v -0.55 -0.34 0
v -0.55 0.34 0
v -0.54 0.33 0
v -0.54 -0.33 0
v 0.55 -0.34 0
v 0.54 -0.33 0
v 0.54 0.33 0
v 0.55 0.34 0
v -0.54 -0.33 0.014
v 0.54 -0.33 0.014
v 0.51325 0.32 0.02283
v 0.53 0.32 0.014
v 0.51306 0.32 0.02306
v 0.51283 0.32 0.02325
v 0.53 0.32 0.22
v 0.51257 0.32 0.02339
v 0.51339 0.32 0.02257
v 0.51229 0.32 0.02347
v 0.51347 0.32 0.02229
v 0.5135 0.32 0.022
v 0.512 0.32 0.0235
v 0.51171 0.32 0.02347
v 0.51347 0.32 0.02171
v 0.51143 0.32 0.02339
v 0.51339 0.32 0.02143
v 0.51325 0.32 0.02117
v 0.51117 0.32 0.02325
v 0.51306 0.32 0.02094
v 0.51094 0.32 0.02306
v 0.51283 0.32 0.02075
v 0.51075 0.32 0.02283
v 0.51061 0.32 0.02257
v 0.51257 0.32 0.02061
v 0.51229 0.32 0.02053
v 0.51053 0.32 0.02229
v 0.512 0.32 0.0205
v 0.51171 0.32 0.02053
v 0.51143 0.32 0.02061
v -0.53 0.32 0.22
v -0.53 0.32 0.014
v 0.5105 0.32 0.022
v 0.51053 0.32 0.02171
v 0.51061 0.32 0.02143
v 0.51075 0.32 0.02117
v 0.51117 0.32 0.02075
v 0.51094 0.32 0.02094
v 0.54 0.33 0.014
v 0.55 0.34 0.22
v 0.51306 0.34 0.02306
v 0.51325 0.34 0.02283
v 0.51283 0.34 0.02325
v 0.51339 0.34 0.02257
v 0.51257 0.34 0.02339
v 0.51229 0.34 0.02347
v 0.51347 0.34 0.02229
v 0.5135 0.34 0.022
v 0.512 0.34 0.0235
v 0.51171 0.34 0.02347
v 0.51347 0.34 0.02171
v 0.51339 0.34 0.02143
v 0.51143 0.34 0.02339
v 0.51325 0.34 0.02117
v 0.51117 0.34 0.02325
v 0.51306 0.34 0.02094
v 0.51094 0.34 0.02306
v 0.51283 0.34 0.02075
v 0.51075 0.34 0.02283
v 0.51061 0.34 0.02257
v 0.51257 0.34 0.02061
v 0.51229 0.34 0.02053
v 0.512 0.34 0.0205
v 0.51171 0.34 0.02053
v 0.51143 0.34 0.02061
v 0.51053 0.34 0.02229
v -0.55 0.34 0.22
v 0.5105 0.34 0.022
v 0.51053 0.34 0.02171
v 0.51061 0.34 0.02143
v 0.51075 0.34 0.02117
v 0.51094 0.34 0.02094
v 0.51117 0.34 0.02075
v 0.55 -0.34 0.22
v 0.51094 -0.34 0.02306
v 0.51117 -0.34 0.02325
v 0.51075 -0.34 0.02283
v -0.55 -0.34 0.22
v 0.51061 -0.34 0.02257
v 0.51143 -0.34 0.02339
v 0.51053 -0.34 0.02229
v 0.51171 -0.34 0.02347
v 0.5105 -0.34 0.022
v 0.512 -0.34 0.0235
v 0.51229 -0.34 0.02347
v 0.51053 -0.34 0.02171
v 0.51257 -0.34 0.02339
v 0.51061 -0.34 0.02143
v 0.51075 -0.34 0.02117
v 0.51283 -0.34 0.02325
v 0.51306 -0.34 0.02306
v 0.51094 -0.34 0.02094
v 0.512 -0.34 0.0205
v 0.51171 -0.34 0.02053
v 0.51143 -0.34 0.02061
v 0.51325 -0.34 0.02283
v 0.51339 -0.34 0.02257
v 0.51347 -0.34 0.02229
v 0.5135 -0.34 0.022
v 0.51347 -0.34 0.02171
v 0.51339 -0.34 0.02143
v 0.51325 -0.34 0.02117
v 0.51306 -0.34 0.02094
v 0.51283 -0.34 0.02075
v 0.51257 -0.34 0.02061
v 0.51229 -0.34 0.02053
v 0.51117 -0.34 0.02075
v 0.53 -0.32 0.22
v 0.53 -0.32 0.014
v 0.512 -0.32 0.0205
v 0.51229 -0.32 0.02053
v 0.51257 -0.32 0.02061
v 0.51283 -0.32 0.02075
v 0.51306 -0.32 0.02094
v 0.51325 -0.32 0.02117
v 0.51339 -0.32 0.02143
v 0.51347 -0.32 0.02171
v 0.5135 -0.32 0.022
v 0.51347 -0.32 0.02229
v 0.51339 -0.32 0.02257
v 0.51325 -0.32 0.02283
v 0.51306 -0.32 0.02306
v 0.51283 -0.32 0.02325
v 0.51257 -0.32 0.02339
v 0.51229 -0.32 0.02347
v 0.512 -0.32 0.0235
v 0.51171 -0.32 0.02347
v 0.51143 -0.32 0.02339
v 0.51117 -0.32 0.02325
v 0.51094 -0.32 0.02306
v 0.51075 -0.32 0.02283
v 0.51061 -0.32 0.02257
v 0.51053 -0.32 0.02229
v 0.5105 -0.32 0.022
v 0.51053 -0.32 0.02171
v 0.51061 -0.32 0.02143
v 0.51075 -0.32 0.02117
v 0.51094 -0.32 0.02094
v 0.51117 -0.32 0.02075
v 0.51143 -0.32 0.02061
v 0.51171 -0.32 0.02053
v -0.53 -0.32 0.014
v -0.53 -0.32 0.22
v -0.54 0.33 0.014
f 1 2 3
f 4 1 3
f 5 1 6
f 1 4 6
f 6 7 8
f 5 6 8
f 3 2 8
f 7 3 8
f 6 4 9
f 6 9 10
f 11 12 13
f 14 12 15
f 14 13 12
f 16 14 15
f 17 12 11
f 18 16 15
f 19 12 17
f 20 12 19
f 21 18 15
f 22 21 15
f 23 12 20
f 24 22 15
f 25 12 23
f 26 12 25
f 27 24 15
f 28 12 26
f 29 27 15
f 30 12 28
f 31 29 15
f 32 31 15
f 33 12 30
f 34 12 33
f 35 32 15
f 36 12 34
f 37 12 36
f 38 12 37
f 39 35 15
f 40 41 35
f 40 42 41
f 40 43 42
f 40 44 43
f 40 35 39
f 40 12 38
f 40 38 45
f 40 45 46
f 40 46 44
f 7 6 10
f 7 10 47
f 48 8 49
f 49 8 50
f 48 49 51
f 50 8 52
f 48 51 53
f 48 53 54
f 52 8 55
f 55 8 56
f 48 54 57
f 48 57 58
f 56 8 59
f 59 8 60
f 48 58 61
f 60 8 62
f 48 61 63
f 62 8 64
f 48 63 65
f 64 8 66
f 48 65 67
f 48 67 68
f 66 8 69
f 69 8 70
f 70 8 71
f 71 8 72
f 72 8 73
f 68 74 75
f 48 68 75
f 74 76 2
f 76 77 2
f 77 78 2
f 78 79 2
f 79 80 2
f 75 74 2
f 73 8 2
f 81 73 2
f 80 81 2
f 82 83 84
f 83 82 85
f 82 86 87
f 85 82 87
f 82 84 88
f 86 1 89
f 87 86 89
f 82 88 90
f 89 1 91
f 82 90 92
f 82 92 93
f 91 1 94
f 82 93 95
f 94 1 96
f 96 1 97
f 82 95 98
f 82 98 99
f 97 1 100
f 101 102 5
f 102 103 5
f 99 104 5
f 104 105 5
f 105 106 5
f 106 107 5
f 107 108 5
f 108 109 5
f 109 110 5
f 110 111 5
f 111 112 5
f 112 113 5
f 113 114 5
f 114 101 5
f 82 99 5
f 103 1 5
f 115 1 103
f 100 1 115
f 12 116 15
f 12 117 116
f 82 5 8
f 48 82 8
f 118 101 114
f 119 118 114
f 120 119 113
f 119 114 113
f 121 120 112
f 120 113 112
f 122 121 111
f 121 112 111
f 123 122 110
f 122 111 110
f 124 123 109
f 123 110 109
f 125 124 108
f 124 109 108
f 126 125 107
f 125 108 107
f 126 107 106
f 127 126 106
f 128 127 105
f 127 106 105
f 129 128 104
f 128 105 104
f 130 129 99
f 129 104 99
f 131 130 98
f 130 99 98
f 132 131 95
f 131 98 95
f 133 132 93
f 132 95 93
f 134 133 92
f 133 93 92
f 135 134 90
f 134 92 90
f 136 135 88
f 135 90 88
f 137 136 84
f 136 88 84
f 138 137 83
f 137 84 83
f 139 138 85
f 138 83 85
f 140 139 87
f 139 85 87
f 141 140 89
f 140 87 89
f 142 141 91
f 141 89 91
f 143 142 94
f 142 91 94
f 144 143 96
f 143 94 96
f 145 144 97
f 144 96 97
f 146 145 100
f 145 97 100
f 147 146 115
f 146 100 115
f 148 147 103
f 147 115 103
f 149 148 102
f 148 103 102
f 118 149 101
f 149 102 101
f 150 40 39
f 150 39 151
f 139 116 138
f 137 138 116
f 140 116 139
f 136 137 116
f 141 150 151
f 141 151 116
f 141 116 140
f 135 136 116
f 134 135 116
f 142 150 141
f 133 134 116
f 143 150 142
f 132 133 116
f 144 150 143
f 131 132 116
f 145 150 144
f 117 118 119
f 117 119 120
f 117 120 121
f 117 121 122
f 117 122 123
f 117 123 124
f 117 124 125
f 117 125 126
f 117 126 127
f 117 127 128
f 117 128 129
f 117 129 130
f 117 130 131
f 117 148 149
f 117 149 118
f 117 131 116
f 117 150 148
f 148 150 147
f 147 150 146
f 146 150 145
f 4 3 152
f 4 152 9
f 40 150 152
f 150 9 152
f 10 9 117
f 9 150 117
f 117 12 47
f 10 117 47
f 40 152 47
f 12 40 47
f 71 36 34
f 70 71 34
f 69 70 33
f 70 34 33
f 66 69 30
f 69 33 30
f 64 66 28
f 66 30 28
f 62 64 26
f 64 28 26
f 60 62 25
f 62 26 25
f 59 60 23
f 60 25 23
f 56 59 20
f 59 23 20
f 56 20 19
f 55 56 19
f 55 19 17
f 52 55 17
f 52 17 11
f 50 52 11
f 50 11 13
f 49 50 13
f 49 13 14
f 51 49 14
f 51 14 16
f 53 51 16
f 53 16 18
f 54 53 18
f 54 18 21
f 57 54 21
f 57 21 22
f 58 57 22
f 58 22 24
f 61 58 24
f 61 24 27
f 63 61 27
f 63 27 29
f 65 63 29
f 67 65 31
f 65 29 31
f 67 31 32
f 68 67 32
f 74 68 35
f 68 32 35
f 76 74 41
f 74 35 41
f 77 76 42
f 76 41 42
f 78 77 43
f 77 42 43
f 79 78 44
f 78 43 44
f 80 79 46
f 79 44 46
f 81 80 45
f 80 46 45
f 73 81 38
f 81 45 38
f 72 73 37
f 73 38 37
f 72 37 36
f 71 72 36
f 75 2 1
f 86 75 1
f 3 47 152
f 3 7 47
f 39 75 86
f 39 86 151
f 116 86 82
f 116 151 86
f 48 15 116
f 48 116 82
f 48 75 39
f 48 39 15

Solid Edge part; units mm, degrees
sketch "Sketch1" plane through (0, 0, 0) normal (0, 0, 1) x (1, 0, 0)
  line L0 (-0.53, 0.32) -> (-0.53, -0.32)
  line L1 (-0.53, -0.32) -> (0.53, -0.32)
  line L2 (0.53, -0.32) -> (0.53, 0.32)
  line L3 (0.53, 0.32) -> (-0.53, 0.32)
  line L4 (-0.55, -0.34) -> (0.55, -0.34)
  line L5 (0.55, -0.34) -> (0.55, 0.34)
  line L6 (0.55, 0.34) -> (-0.55, 0.34)
  line L7 (-0.55, 0.34) -> (-0.55, -0.34)
  dimension "D1" = 0.55
  dimension "D2" = 0.55
extrude "Protrusion1" add sketch "Sketch1" along normal blind 0.22
sketch "Sketch2" plane through (0, 0, 0) normal (0, 0, -1) x (1, 0, 0)
  line L0 (-0.54, -0.33) -> (-0.54, 0.33)
  line L1 (-0.54, 0.33) -> (0.54, 0.33)
  line L2 (0.54, 0.33) -> (0.54, -0.33)
  line L3 (0.54, -0.33) -> (-0.54, -0.33)
  line L4 (-0.53, 0.32) -> (0.53, 0.32)
  line L5 (0.53, 0.32) -> (0.53, -0.32)
  line L6 (0.53, -0.32) -> (-0.53, -0.32)
  line L7 (-0.53, -0.32) -> (-0.53, 0.32)
extrude "Ausschnitt_1" cut sketch "Sketch2" against normal blind 0.014
hole "Bohrung_1" at (0.512, -0.34, 0.022) direction (0, 1, 0) diameter 0.003 end through all
